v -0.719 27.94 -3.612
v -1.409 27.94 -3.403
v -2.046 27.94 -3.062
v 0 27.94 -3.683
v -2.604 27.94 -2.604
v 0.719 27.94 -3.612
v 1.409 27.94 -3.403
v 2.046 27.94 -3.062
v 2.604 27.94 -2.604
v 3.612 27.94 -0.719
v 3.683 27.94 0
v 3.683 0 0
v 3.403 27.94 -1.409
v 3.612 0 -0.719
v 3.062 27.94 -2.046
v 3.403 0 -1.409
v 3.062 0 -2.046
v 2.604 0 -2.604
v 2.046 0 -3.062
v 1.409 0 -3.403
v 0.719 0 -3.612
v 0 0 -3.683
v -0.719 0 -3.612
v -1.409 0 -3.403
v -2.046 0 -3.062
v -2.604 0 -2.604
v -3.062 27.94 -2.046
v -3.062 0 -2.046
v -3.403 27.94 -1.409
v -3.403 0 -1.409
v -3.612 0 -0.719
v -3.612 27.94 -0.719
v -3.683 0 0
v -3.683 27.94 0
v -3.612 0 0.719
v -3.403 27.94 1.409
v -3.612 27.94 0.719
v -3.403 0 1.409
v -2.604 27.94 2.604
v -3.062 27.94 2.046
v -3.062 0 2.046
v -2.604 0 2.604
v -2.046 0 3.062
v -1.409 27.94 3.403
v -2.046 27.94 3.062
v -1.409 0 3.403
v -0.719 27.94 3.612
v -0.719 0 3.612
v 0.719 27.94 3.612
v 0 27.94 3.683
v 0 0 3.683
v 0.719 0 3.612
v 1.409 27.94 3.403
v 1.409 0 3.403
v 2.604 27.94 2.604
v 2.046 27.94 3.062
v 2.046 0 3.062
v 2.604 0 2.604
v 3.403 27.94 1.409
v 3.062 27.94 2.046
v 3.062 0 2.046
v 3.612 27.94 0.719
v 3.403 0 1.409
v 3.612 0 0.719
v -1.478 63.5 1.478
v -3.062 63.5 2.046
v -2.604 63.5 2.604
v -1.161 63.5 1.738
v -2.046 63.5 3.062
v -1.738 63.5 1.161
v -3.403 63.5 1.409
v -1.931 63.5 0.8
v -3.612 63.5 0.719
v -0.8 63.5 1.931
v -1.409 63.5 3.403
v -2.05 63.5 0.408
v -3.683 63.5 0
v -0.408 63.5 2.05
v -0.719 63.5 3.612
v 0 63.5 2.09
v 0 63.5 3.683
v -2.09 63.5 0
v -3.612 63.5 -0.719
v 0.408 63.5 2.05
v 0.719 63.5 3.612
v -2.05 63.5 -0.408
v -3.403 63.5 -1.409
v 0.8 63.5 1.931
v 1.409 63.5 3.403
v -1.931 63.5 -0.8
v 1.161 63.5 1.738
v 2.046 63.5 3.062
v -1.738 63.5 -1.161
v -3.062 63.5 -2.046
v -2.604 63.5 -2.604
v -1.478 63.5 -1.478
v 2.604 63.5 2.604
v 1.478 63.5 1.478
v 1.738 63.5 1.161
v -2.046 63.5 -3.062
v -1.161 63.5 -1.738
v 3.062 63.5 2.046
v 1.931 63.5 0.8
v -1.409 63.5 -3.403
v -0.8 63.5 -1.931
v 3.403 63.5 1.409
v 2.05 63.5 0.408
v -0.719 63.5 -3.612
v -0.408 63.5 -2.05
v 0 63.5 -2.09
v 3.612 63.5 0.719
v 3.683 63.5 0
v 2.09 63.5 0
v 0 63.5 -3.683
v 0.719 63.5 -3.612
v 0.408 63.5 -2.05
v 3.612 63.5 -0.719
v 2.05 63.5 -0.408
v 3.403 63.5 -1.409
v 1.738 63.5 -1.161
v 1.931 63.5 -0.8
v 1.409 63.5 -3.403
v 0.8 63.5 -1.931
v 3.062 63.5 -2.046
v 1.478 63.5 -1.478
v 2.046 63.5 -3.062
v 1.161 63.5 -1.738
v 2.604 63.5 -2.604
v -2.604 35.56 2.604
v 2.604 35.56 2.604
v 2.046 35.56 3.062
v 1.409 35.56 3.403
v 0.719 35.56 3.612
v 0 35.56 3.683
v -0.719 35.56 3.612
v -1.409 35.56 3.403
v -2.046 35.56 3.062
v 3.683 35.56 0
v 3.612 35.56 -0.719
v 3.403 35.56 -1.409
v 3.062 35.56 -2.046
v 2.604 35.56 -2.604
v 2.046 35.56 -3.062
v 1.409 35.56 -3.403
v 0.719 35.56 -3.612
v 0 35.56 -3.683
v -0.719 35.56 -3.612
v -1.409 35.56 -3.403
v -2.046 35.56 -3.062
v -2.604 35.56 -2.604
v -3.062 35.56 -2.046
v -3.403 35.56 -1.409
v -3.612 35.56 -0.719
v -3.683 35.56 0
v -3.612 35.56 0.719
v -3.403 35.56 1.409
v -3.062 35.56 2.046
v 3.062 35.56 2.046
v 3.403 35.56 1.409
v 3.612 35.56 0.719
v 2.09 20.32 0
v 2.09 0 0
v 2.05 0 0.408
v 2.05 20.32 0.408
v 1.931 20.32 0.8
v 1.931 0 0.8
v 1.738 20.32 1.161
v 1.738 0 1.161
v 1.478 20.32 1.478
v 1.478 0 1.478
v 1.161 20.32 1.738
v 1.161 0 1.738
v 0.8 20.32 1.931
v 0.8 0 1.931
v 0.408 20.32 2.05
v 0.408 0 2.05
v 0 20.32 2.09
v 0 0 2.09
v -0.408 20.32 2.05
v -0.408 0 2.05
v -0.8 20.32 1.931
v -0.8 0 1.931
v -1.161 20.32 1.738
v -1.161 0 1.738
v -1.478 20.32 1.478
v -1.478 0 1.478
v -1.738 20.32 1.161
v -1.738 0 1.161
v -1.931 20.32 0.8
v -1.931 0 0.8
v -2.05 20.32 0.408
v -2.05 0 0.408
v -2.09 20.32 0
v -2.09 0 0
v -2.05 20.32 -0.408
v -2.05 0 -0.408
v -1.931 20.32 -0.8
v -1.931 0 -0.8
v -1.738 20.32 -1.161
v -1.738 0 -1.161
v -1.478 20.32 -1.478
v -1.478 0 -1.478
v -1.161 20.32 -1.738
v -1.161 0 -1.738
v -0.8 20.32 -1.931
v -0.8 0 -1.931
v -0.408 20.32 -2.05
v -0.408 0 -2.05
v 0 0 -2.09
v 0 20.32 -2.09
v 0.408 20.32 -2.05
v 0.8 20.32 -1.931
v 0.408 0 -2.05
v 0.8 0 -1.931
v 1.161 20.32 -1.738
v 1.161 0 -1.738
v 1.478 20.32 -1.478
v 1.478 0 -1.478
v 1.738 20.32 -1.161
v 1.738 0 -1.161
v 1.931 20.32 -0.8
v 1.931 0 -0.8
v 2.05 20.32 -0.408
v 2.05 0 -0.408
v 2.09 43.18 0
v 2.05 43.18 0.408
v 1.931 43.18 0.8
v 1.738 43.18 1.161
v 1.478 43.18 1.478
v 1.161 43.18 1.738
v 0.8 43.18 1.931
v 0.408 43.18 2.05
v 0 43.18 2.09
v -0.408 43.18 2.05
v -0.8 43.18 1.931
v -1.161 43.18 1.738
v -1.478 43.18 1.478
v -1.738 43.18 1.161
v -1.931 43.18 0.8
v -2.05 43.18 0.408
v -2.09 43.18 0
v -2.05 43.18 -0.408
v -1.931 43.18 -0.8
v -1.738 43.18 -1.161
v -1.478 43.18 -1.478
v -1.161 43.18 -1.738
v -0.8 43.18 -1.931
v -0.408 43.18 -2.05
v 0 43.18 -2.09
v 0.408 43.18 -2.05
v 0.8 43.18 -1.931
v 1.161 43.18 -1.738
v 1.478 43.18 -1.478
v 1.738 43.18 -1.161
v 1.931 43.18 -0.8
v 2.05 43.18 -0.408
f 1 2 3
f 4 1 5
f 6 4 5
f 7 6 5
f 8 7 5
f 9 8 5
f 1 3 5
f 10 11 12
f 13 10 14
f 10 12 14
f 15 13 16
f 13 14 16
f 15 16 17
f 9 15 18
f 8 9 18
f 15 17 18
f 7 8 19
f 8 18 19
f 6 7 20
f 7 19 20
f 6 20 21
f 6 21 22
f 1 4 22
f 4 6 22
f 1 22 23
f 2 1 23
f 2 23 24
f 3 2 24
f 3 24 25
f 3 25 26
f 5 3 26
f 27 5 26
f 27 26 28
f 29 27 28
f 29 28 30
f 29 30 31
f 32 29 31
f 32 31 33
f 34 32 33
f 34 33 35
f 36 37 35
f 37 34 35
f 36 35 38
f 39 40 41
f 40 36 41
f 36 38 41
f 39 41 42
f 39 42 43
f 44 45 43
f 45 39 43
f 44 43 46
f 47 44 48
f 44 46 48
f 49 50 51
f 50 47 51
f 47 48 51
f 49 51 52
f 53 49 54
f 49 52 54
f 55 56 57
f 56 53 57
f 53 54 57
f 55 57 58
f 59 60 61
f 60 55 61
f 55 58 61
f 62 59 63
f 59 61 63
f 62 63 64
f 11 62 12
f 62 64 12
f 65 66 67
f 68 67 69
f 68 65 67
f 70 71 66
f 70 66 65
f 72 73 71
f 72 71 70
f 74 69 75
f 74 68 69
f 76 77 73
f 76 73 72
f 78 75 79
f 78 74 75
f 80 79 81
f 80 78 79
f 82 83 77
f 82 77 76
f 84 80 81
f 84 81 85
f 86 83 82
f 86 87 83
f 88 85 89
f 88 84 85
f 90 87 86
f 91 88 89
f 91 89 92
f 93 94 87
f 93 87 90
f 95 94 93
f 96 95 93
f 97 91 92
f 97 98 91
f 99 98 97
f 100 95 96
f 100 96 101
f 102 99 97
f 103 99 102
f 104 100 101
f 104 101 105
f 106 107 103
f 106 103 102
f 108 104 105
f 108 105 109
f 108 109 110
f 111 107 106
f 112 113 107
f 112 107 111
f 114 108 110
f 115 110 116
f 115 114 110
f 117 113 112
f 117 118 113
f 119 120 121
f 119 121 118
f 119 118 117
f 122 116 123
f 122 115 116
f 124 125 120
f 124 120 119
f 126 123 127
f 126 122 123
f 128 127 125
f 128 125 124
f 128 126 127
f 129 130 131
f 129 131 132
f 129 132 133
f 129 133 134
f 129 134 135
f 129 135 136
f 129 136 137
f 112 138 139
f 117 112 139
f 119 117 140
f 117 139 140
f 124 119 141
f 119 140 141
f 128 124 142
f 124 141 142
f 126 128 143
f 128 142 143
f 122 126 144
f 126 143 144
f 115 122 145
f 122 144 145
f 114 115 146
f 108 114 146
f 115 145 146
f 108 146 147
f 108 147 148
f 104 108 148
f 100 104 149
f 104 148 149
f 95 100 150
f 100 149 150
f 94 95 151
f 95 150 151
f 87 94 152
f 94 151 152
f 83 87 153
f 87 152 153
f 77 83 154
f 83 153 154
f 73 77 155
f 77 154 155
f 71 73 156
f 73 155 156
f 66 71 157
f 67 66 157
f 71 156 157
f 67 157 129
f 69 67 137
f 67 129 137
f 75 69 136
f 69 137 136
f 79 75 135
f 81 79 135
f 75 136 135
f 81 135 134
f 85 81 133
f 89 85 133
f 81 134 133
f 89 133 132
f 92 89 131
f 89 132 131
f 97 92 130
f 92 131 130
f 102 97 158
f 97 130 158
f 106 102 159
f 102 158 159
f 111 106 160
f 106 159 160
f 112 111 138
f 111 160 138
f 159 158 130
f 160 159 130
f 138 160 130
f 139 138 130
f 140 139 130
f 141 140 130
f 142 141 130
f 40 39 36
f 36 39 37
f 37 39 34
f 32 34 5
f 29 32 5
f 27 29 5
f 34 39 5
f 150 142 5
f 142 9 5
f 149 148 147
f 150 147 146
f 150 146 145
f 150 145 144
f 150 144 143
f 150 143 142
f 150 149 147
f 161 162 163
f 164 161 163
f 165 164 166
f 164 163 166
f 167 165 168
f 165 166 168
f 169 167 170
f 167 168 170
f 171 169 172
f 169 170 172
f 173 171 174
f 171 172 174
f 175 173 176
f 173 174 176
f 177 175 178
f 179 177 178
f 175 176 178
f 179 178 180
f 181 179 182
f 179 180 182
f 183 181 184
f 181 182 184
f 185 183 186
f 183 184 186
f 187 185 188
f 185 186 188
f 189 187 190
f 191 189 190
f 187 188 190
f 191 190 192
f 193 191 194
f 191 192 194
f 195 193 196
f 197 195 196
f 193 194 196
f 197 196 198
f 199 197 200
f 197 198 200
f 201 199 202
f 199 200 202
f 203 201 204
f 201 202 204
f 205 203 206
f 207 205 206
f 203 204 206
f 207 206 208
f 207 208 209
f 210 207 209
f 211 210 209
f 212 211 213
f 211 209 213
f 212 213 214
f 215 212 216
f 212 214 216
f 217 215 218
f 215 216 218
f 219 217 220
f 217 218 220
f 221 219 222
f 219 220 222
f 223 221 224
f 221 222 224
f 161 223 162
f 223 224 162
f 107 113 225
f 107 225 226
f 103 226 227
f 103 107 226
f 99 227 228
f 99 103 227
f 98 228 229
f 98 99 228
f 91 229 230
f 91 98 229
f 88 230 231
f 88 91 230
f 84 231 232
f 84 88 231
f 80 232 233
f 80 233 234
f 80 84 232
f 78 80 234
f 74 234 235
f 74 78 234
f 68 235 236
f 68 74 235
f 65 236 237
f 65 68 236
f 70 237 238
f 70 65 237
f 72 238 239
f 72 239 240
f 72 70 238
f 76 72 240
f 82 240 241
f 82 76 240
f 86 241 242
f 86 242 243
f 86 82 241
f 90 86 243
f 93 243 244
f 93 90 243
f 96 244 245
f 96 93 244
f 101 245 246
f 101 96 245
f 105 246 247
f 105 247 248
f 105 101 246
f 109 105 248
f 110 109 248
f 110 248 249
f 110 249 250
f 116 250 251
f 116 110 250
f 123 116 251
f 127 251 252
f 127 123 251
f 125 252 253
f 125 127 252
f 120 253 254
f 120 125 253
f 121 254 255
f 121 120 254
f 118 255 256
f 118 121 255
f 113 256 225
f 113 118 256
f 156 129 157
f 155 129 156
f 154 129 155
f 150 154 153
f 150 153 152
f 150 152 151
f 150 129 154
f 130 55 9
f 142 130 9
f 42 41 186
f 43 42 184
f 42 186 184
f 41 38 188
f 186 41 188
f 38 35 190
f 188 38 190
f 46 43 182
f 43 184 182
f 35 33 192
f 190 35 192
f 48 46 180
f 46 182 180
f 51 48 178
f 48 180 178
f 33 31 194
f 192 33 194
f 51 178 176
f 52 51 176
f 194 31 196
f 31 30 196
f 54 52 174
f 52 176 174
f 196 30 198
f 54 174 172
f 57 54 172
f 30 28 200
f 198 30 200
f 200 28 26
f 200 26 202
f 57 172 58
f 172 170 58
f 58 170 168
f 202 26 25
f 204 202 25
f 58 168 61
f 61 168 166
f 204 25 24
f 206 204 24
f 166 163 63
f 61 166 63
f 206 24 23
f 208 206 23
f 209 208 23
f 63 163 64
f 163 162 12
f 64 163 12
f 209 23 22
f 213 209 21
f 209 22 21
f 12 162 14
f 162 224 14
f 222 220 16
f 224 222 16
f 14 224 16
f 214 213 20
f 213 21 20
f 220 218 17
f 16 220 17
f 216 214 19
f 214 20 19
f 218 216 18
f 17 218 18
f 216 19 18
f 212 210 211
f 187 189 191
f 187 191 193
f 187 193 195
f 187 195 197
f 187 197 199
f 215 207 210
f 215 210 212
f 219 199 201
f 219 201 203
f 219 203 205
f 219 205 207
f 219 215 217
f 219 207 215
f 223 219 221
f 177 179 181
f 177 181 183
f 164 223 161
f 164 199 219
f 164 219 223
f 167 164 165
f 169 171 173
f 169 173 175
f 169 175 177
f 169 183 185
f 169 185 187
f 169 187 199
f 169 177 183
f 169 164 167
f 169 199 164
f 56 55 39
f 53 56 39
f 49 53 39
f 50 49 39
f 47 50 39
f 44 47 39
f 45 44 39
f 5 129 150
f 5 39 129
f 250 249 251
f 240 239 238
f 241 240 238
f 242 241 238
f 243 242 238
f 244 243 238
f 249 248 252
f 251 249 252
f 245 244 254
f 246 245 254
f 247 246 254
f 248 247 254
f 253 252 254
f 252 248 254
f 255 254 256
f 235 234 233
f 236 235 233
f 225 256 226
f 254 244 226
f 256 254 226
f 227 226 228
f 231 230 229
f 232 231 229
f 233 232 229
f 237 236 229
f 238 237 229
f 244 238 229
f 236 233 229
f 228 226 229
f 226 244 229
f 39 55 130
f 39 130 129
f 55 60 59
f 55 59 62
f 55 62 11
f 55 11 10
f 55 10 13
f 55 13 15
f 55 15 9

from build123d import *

# Parameters (mm, degrees)
SKETCH1_R           = 3.683
BOSS_EXTRUDE1_DEPTH = 63.5
SKETCH7_R           = 2.09
CUT_EXTRUDE1_DEPTH  = 20.32
SKETCH8_OUTSIDE_W   = 22.236
SKETCH8_OUTSIDE_H   = 22.236
SKETCH8_OUTSIDE_W_2 = 5.20854855
SKETCH8_OUTSIDE_H_2 = 5.20854855
CUT_EXTRUDE3_DEPTH  = 3.81


with BuildPart() as part:
    # Sketch1 → Boss-Extrude1 (new body)
    with BuildSketch(Plane(origin=(0, 0, 0), x_dir=(1, 0, 0), z_dir=(0, 1, 0))):
        Circle(SKETCH1_R)
    extrude(amount=BOSS_EXTRUDE1_DEPTH)

    # Sketch7 → Cut-Extrude1 (cut)
    with BuildSketch(Plane.XZ):
        Circle(SKETCH7_R)
    cut_extrude1 = extrude(amount=-CUT_EXTRUDE1_DEPTH, mode=Mode.SUBTRACT)

    # Mirror1: Cut-Extrude1 across plane
    add(cut_extrude1.mirror(Plane(origin=(0, 31.75, 0), x_dir=(0, 0, 1), z_dir=(0, -1, 0))), mode=Mode.SUBTRACT)

    # Sketch8 outside → Cut-Extrude3 (cut, symmetric)
    with BuildSketch(Plane(origin=(0, 31.75, 0), x_dir=(-1, 0, 0), z_dir=(0, -1, 0))):
        Rectangle(SKETCH8_OUTSIDE_W, SKETCH8_OUTSIDE_H)
        Rectangle(SKETCH8_OUTSIDE_W_2, SKETCH8_OUTSIDE_H_2, mode=Mode.SUBTRACT)
    extrude(amount=CUT_EXTRUDE3_DEPTH, both=True, mode=Mode.SUBTRACT)


solid = part.part
